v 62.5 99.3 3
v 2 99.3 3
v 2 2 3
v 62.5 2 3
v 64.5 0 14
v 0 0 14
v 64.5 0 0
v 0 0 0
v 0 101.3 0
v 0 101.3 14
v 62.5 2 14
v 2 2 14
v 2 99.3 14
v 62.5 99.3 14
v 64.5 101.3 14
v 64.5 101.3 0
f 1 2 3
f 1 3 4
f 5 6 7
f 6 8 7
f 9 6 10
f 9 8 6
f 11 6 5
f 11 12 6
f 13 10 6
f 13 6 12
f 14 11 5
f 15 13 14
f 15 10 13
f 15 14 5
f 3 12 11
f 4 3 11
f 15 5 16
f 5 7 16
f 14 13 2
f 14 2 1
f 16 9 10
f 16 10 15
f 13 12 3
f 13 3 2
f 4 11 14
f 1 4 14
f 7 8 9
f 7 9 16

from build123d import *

# Parameters (mm, degrees)
F0_W      = 64.5
F0_H      = 101.3
F1_DEPTH  = 3
F1_FACE_W = 64.5
F1_FACE_H = 101.3
F2_DEPTH  = 11
F3_W      = 60.5
F3_H      = 97.3
F4_DEPTH  = 11


with BuildPart() as f1:
    # F0 (on Top) → F1 (new body)
    with BuildSketch(Plane.XY):
        with Locations((32.25, 50.65)):
            Rectangle(F0_W, F0_H)
    extrude(amount=F1_DEPTH)

    # F1_face (on face) → F2 (join)
    with BuildSketch(Plane(origin=(32.25, 50.65, 3), x_dir=(1, 0, 0), z_dir=(0, 0, 1))):
        Rectangle(F1_FACE_W, F1_FACE_H)
    extrude(amount=F2_DEPTH)

    # F3 (on face) → F4 (cut)
    with BuildSketch(Plane.XY.offset(14)):
        with Locations((32.25, 50.65)):
            Rectangle(F3_W, F3_H)
    extrude(amount=-F4_DEPTH, mode=Mode.SUBTRACT)


solid = f1.part
